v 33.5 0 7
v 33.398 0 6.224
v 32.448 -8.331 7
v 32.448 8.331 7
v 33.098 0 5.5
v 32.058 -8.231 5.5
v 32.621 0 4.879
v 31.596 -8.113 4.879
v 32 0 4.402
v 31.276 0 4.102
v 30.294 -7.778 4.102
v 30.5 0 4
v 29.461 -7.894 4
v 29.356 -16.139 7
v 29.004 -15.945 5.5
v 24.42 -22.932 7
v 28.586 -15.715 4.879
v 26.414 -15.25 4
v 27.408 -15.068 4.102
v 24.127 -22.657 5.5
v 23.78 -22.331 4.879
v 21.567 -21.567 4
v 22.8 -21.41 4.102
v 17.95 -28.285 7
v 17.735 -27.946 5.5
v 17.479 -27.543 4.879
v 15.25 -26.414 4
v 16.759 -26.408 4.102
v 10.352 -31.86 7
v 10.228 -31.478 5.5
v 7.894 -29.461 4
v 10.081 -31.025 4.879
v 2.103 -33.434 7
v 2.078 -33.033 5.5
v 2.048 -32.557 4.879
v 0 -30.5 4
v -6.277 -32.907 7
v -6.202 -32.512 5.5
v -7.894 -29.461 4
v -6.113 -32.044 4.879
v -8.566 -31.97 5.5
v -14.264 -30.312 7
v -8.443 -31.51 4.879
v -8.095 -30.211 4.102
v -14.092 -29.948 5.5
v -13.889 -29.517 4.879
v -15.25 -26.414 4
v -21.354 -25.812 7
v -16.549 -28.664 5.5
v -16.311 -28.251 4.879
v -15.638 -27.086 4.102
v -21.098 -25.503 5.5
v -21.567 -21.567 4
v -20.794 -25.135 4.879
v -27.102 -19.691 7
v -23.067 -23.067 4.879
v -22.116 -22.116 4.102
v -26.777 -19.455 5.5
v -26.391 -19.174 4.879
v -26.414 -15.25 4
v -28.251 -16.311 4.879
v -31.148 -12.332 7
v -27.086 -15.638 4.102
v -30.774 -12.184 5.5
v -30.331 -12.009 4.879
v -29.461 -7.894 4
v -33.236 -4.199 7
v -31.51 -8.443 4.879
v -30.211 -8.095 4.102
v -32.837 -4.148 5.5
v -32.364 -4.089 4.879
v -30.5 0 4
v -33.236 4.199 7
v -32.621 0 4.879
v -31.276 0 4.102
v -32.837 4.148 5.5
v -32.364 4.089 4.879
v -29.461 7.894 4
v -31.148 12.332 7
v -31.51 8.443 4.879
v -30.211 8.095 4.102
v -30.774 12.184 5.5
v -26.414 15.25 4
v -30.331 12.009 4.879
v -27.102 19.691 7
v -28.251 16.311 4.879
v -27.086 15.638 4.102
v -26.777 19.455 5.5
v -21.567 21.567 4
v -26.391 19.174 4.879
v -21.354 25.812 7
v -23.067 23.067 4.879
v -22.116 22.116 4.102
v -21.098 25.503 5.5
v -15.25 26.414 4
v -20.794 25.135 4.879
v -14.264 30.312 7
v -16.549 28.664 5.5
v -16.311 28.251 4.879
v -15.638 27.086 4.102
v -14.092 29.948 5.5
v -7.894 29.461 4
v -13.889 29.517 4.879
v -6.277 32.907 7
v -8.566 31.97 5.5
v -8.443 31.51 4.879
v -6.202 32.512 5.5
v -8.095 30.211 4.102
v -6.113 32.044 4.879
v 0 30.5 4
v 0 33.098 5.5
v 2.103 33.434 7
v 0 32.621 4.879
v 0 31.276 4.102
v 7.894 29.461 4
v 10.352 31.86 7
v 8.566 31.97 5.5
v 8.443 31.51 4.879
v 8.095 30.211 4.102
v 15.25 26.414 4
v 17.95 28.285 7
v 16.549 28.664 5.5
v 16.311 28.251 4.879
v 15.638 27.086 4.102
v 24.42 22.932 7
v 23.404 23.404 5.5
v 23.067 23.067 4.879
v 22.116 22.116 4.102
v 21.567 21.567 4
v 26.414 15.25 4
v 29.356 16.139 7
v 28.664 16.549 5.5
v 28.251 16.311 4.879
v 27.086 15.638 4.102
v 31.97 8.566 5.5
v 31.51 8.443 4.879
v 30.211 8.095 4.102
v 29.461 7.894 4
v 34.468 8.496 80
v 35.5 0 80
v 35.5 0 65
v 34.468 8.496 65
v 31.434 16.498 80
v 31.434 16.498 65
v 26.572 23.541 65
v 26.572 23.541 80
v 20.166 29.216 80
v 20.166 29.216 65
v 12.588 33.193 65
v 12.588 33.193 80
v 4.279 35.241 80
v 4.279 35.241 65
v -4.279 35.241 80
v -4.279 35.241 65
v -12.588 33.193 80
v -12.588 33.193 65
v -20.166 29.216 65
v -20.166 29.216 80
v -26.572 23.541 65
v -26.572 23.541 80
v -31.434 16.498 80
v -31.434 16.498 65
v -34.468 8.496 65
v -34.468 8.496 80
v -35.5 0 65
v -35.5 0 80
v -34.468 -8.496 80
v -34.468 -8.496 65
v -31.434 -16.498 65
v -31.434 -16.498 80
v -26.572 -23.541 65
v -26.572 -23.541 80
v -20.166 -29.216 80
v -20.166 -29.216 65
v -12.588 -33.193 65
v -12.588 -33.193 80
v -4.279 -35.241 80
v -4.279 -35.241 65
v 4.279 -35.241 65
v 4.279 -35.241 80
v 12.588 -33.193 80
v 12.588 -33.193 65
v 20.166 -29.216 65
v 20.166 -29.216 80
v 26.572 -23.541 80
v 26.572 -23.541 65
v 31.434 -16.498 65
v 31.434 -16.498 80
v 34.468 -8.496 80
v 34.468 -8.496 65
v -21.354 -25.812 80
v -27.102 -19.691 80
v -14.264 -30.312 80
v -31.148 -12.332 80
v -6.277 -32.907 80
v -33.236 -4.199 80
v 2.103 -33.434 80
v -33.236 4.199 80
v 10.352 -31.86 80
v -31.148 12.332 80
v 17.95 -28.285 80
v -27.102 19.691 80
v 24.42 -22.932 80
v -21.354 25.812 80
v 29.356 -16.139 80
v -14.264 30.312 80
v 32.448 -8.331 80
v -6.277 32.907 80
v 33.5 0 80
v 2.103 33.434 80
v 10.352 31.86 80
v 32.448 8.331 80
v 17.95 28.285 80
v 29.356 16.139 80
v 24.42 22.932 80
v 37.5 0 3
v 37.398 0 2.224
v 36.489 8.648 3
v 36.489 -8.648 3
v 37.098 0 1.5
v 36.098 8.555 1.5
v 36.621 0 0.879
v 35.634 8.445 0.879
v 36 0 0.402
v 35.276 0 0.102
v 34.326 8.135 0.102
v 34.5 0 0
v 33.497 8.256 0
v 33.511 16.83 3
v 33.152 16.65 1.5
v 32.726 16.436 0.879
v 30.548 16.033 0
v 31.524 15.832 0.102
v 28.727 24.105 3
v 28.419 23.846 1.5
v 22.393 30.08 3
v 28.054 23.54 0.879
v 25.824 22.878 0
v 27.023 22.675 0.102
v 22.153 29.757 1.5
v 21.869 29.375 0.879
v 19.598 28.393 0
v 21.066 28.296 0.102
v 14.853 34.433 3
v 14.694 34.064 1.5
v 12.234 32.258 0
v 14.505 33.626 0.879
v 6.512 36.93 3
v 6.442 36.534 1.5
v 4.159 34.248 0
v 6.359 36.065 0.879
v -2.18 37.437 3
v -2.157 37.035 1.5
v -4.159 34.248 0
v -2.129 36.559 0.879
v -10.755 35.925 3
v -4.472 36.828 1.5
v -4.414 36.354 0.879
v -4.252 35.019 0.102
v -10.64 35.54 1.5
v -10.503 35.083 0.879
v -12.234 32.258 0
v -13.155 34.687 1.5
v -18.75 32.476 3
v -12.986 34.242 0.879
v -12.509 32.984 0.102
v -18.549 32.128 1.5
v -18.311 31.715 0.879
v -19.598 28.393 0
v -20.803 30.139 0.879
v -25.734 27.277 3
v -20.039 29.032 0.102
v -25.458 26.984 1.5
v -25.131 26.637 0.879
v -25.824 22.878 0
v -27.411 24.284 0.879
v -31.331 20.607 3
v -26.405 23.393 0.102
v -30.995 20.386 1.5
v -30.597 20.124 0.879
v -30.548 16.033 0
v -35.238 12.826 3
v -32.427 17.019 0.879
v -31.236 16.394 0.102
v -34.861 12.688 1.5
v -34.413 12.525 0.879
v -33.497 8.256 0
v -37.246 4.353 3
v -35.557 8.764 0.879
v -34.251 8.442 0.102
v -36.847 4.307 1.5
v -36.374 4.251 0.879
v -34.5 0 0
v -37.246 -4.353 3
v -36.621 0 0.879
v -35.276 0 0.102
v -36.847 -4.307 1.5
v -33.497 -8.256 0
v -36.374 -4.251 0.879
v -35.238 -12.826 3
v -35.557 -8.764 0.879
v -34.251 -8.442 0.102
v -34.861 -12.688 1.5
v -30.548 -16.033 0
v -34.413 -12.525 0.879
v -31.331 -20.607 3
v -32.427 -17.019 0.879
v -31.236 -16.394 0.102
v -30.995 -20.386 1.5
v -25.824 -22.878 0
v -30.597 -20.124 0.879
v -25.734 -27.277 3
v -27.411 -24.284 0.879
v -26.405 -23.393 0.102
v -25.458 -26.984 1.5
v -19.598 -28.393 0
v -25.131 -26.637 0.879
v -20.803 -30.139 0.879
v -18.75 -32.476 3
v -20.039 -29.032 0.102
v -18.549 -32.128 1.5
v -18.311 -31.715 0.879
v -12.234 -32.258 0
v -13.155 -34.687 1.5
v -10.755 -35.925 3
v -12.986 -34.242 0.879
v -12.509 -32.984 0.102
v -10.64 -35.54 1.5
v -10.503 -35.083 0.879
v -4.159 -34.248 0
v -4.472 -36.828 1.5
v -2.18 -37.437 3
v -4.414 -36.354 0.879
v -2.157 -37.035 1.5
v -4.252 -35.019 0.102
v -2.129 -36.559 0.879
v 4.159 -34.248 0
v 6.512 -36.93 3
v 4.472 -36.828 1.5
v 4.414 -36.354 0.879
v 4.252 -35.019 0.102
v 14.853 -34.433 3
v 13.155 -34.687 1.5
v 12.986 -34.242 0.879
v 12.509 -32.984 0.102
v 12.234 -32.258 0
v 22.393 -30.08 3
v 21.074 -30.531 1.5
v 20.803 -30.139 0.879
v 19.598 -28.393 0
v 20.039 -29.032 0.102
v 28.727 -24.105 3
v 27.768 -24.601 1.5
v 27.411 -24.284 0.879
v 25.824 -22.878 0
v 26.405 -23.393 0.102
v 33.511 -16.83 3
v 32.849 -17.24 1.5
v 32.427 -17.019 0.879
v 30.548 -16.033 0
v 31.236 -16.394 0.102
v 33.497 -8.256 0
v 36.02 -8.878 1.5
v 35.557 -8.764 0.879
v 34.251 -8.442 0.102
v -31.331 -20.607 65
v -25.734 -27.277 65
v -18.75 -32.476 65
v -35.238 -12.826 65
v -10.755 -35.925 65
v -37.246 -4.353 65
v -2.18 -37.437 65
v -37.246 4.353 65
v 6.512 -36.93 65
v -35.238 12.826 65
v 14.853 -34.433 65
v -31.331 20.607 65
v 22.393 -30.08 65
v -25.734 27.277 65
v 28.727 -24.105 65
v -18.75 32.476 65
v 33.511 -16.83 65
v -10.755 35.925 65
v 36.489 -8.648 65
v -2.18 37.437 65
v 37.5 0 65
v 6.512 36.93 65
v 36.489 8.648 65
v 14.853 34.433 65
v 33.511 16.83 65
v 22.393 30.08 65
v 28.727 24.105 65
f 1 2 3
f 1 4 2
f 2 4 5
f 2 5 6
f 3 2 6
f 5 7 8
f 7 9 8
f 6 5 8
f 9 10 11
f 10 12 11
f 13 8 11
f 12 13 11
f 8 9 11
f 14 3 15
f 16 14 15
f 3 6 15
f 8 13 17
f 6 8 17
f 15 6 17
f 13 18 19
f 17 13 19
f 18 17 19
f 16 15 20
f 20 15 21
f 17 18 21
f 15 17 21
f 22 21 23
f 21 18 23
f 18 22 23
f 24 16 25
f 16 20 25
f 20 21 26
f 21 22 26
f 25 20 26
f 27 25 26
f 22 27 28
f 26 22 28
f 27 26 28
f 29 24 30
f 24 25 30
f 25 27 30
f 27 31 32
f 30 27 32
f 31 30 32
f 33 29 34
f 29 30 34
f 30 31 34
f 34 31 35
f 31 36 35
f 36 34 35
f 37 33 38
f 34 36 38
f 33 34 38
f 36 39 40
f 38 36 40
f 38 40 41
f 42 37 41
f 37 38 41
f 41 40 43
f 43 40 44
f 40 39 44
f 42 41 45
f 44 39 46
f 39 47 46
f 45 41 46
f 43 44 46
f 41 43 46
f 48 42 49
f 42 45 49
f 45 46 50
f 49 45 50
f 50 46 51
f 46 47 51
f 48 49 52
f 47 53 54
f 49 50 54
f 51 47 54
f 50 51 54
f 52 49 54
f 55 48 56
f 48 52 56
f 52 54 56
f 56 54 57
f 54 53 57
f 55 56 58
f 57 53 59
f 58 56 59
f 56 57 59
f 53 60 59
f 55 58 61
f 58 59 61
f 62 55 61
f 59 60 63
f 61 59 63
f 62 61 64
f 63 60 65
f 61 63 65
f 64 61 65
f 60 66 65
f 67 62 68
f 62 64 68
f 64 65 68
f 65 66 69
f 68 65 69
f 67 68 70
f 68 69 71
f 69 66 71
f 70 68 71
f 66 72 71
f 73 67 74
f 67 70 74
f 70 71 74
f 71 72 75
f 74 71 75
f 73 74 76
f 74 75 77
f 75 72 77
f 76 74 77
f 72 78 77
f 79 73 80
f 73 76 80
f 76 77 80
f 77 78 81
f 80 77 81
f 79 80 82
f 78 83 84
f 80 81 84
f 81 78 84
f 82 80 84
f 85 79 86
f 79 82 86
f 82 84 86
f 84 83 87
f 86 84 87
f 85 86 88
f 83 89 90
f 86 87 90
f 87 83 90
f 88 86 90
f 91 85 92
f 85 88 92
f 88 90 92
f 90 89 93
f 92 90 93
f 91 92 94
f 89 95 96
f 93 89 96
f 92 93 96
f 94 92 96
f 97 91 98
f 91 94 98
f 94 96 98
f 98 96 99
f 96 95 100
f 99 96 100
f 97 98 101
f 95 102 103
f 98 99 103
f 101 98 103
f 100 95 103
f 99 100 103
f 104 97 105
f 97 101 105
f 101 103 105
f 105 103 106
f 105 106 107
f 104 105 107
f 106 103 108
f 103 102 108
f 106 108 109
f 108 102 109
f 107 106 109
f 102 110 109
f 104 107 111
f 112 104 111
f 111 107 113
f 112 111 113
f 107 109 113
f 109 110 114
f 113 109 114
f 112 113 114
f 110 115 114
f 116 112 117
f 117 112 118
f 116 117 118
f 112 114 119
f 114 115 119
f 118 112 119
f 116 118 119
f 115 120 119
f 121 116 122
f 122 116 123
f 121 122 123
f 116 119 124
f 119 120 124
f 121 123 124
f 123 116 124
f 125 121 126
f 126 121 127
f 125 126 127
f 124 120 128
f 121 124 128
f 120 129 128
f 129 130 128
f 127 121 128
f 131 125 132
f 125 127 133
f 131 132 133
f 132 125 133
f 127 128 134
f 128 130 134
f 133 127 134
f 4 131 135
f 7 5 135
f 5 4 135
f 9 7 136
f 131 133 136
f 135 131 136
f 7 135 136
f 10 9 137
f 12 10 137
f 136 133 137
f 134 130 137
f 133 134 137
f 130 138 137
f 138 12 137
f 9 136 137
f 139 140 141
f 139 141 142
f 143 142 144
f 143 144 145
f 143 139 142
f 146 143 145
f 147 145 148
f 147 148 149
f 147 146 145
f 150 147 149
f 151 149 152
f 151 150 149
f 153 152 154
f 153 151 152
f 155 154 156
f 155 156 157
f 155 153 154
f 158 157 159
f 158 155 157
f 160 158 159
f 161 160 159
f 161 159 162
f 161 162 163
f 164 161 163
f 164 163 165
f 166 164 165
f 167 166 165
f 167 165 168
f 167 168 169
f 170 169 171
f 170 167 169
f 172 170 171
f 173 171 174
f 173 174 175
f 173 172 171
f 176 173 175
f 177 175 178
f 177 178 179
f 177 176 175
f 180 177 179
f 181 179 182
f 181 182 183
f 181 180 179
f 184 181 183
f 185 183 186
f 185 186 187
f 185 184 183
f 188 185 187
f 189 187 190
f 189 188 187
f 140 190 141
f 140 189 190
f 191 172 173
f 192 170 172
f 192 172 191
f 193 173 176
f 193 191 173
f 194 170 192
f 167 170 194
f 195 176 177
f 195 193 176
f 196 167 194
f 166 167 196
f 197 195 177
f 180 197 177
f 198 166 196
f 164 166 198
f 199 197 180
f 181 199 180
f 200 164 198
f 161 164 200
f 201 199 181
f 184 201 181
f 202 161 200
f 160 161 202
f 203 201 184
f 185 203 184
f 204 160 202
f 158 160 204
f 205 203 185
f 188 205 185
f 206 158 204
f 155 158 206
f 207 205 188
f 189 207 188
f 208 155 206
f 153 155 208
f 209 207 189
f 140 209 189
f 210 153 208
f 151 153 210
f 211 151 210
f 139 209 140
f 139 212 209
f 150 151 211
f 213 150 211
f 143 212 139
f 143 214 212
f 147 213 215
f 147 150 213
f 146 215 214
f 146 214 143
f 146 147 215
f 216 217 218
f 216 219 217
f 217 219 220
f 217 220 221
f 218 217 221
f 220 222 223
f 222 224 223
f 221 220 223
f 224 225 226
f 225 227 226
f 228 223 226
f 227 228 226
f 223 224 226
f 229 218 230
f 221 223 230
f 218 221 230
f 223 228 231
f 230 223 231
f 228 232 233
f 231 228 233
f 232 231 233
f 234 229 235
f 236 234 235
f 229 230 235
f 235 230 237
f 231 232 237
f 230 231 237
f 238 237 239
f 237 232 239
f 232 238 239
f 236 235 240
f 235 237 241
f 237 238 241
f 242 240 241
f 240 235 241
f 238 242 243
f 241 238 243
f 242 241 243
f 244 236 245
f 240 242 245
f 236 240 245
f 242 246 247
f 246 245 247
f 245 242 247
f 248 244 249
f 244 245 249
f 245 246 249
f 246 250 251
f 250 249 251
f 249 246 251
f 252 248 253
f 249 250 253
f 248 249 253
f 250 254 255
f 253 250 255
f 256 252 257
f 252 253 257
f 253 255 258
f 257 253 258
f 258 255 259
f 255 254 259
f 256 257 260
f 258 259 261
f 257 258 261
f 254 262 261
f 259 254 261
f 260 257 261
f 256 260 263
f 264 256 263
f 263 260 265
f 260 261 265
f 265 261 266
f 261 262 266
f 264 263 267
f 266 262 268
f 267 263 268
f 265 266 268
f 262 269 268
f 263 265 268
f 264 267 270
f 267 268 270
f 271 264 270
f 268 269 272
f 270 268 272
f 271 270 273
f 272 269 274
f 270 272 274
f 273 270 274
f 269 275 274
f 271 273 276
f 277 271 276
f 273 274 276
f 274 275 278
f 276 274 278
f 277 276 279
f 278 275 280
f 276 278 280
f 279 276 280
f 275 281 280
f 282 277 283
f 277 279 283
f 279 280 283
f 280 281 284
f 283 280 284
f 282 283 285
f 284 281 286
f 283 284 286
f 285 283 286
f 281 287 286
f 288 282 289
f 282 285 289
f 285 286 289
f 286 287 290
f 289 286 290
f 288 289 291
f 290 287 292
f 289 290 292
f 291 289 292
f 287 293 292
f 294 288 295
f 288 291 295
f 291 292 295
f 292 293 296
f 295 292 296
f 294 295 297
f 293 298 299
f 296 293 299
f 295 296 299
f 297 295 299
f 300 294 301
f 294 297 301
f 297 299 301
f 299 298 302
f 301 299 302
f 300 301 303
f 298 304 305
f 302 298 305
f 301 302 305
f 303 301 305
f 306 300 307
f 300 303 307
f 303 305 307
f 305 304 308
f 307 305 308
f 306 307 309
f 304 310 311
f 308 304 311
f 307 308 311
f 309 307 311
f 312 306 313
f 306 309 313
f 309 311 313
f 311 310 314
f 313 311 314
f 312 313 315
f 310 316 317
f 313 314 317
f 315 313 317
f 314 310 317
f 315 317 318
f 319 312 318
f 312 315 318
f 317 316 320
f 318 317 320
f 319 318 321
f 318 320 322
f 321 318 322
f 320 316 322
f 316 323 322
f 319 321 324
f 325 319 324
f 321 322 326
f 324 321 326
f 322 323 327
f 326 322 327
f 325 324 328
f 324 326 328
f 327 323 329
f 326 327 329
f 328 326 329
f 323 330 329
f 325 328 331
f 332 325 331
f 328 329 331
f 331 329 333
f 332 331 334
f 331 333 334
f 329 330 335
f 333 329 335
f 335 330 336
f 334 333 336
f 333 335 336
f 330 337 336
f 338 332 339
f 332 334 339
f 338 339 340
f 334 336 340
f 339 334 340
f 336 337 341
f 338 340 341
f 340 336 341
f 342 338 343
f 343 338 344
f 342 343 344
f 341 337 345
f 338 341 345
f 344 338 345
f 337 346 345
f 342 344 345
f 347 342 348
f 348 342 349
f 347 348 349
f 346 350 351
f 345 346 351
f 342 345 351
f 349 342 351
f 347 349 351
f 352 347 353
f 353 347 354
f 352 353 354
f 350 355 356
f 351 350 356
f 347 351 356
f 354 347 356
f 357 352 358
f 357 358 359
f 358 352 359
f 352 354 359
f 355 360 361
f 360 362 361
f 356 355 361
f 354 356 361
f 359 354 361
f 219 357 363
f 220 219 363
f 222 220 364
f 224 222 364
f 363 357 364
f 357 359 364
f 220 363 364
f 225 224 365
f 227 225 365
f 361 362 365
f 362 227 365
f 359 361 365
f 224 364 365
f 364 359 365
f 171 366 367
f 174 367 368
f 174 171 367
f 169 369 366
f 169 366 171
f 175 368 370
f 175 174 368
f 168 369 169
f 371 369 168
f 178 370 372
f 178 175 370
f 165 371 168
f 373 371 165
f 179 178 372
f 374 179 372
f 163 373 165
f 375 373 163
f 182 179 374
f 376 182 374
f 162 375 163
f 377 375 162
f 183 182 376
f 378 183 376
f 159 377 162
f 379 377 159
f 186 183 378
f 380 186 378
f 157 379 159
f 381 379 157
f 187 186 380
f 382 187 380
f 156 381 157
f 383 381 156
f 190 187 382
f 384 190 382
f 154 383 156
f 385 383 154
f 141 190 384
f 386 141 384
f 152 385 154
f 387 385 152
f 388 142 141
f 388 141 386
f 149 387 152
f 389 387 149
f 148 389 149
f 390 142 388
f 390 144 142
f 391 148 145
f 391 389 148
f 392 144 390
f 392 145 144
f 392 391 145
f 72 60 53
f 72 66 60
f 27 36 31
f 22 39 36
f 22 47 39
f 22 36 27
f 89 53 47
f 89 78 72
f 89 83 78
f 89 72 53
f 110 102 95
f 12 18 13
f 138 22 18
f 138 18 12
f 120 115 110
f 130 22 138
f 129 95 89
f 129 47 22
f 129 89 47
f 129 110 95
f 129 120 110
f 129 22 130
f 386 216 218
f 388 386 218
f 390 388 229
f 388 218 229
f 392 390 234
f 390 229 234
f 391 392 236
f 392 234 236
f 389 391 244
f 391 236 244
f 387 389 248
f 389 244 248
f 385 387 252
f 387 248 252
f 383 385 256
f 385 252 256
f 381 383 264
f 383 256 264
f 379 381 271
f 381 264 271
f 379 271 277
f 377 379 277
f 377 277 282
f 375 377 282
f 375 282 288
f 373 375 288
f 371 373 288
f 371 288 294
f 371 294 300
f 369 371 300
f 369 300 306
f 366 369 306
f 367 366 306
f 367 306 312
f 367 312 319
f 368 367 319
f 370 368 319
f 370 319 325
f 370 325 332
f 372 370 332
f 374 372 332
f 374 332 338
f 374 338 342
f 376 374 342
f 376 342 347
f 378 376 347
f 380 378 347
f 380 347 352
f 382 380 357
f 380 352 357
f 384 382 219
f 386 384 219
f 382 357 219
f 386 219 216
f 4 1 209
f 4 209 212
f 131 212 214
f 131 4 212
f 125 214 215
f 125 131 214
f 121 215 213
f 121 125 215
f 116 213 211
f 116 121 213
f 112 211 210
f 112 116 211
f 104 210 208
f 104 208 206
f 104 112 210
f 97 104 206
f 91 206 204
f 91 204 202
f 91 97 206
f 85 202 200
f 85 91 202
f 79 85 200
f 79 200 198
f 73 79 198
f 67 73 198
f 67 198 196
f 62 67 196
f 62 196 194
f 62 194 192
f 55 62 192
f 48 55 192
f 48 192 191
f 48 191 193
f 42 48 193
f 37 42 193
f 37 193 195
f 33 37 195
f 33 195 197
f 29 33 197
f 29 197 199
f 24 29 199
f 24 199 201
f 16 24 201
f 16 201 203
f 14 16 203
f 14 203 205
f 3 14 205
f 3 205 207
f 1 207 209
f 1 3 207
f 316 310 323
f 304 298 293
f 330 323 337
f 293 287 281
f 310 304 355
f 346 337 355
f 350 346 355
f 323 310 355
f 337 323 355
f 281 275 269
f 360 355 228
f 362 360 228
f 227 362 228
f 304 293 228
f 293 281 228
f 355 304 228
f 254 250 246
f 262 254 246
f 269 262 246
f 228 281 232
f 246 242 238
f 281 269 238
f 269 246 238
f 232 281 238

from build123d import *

# Parameters (mm, degrees)
F0_R     = 37.5
F1_DEPTH = 80
F2_T     = -4
F3_R     = 37.5
F3_R_2   = 35.5
F4_DEPTH = 15
F5_R     = 3


with BuildPart() as f1:
    # F0 (on Top) → F1 (new body)
    with BuildSketch(Plane.XY):
        Circle(F0_R)
    extrude(amount=F1_DEPTH)

    # F2
    f2_openings = [f1.faces().sort_by_distance(p)[0] for p in [
        (0, 0, 80),
    ]]
    offset(amount=F2_T, openings=f2_openings)

    # F3 (on face) → F4 (cut)
    with BuildSketch(Plane.XY.offset(80)):
        Circle(F3_R)
        Circle(F3_R_2, mode=Mode.SUBTRACT)
    extrude(amount=-F4_DEPTH, mode=Mode.SUBTRACT)

    # F5
    f5_edges = [f1.edges().sort_by_distance(p)[0] for p in [
        (-37.5, 0, 0),
        (-33.5, 0, 4),
    ]]
    fillet(f5_edges, radius=F5_R)


solid = f1.part
